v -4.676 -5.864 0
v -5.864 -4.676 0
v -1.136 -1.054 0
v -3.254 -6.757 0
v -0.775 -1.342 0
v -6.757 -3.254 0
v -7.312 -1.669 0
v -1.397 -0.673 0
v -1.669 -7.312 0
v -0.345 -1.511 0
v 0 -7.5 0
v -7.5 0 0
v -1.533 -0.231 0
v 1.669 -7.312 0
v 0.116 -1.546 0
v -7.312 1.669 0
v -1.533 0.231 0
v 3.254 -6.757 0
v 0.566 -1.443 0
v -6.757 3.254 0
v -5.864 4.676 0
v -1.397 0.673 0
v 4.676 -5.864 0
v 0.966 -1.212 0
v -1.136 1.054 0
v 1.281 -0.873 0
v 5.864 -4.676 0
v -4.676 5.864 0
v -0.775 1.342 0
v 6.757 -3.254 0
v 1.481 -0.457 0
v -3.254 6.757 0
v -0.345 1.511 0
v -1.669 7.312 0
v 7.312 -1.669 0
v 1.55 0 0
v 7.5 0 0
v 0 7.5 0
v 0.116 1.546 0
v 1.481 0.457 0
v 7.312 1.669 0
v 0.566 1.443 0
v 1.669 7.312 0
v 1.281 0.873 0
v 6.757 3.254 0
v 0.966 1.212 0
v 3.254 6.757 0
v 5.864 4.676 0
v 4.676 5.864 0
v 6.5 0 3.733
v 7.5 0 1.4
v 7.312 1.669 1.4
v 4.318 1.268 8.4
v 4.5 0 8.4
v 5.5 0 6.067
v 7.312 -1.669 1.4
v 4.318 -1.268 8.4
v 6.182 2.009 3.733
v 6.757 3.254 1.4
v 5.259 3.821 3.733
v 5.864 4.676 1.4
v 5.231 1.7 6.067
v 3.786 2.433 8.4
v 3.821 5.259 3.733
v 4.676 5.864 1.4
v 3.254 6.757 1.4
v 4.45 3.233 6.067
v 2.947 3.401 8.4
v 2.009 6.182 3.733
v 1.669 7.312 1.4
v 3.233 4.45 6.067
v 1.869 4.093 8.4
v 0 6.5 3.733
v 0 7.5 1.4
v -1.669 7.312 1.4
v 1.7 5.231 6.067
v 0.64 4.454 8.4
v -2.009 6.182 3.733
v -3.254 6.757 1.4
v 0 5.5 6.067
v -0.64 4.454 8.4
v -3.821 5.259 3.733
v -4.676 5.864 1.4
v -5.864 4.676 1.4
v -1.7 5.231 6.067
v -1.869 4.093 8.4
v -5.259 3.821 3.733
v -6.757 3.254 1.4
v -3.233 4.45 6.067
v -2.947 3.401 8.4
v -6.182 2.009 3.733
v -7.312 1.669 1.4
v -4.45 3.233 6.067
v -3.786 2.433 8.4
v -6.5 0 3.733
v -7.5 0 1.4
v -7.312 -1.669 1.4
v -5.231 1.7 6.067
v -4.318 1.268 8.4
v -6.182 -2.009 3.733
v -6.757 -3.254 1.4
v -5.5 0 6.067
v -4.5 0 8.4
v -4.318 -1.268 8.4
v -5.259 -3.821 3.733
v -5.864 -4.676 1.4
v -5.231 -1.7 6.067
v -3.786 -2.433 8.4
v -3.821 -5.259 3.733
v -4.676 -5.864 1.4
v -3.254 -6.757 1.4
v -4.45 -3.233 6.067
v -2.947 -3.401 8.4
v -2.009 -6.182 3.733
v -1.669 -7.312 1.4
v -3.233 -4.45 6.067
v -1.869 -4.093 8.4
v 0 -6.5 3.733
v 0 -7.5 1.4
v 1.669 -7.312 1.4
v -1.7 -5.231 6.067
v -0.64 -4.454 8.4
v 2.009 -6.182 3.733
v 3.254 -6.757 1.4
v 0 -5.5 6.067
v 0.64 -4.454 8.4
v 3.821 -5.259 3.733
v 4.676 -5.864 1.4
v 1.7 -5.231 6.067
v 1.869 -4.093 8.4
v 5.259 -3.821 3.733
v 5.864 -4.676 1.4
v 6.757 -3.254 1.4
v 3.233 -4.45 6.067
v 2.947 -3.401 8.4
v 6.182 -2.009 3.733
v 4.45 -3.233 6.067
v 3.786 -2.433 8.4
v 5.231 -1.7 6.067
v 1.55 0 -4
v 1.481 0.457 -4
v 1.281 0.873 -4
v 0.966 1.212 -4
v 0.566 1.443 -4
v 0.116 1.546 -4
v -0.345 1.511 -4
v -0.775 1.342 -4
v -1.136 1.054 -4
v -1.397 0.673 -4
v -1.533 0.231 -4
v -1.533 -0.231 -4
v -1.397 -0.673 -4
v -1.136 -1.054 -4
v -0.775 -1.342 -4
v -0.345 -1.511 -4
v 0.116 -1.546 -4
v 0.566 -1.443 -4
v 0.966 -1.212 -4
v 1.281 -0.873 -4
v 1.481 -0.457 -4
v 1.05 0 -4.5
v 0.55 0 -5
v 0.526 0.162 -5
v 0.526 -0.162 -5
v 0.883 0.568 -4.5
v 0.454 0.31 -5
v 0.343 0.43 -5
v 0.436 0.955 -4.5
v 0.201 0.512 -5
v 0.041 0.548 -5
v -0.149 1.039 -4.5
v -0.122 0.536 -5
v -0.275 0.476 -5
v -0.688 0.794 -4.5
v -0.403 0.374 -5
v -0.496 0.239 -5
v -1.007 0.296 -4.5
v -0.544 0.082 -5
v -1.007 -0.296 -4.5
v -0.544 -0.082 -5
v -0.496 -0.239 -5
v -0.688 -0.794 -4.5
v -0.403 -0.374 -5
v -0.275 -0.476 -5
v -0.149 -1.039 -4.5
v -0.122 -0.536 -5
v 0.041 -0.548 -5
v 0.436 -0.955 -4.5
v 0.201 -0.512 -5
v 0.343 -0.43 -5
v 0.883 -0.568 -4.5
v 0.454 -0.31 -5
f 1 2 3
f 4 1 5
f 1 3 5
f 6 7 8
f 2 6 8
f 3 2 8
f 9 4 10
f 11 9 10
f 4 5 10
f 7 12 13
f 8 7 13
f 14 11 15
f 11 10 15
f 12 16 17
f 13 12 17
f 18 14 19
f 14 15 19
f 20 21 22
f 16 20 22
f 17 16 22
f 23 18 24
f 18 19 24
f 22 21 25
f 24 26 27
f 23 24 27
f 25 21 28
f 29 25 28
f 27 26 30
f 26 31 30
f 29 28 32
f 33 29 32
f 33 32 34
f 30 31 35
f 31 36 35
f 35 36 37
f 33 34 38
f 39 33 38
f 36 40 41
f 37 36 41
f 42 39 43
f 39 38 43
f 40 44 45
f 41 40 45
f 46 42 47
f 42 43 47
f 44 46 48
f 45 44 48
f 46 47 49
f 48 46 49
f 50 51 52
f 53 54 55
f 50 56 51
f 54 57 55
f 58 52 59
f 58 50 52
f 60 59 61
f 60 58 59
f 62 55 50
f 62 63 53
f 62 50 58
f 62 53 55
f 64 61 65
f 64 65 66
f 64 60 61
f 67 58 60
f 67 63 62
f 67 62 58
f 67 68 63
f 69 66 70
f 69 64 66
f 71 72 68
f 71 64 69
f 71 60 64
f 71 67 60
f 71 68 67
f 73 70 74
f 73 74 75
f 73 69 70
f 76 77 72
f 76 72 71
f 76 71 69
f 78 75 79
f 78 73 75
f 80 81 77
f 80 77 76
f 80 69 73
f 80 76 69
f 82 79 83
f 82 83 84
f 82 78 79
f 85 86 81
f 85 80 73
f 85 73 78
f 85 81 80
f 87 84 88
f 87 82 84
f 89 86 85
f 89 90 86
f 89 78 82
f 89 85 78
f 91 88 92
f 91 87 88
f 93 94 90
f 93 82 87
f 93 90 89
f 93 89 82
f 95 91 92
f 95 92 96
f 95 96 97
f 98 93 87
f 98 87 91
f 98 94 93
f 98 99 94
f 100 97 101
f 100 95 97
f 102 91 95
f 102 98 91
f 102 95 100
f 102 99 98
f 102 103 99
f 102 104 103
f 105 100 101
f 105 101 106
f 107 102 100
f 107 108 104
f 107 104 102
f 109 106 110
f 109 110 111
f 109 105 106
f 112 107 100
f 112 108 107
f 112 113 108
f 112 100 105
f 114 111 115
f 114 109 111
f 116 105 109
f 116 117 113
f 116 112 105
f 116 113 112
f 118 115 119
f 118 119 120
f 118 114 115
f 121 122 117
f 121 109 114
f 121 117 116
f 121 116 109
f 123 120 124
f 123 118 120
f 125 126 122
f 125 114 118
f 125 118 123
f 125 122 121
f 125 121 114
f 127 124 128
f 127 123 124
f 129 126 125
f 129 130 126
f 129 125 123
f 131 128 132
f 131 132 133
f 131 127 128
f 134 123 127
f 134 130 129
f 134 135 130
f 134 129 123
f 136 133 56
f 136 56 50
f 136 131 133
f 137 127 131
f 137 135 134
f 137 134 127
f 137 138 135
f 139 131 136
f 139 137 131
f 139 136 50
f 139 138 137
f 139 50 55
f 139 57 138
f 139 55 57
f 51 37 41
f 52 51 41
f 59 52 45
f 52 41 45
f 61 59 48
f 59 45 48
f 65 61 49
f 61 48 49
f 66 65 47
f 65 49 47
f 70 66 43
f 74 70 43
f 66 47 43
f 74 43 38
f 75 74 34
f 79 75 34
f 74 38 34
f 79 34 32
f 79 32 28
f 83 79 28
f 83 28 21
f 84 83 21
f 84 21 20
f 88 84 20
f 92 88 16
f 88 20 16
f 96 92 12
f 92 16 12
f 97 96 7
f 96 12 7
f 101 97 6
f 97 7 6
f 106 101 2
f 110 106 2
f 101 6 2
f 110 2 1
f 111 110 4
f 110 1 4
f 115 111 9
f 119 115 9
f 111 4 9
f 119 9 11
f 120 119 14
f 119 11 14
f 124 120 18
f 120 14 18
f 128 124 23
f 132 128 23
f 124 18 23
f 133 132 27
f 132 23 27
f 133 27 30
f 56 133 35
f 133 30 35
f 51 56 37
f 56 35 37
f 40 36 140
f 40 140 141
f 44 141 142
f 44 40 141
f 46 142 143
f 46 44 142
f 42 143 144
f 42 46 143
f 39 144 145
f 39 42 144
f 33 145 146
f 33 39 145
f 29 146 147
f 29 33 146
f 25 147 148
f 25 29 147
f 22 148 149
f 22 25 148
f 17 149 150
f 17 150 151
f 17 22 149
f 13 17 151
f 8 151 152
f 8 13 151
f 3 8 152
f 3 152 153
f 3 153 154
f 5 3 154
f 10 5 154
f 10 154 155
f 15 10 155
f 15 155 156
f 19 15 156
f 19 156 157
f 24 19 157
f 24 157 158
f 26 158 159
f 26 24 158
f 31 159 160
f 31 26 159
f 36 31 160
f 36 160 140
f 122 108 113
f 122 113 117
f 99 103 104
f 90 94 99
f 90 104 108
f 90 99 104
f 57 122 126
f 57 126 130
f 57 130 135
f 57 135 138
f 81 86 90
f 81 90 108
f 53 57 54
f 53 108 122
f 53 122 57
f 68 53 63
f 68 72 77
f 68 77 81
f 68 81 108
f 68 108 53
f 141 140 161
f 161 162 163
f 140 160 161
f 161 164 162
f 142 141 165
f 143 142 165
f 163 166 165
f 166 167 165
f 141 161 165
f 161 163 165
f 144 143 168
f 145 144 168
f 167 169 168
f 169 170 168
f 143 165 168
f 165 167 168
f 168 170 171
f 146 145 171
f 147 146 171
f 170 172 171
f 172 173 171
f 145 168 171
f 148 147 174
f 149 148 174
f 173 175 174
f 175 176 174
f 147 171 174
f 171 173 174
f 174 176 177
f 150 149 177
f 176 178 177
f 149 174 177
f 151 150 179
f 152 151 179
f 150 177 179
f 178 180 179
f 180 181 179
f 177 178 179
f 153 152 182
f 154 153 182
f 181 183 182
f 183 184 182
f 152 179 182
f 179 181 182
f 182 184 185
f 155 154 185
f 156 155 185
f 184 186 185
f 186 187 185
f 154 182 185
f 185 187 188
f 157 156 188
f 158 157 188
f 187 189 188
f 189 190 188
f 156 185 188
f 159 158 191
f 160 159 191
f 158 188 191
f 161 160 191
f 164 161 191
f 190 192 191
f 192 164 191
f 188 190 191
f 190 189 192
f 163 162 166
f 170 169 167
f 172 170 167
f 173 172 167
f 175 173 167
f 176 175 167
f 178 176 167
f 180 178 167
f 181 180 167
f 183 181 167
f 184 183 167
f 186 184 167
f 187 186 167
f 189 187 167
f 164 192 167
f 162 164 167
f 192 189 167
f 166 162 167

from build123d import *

# Parameters (mm, degrees)
SKETCH_R         = 1.55
PAD_DEPTH        = 5
SKETCH001_R      = 7.5
PAD001_DEPTH     = 8.4
CHAMFER_SIZE     = 1
CHAMFER001_SIZE2 = 3
CHAMFER001_SIZE  = 7


with BuildPart() as part:
    # Sketch → Pad (new body)
    with BuildSketch(Plane.XY):
        Circle(SKETCH_R)
    extrude(amount=-PAD_DEPTH)

    # Sketch001 → Pad001 (join)
    with BuildSketch(Plane.XY):
        Circle(SKETCH001_R)
    extrude(amount=PAD001_DEPTH)

    # Chamfer
    chamfer_edges = [part.edges().sort_by_distance(p)[0] for p in [
        (-1.55, 0, -5),
    ]]
    chamfer(chamfer_edges, length=CHAMFER_SIZE)

    # Chamfer001
    chamfer001_edges = [part.edges().sort_by_distance(p)[0] for p in [
        (-7.5, 0, 8.4),
    ]]
    chamfer001_side = part.faces().sort_by_distance((-7.5, 0, 4.2))[0]
    chamfer(chamfer001_edges, length=CHAMFER001_SIZE, length2=CHAMFER001_SIZE2, reference=chamfer001_side)


solid = part.part
